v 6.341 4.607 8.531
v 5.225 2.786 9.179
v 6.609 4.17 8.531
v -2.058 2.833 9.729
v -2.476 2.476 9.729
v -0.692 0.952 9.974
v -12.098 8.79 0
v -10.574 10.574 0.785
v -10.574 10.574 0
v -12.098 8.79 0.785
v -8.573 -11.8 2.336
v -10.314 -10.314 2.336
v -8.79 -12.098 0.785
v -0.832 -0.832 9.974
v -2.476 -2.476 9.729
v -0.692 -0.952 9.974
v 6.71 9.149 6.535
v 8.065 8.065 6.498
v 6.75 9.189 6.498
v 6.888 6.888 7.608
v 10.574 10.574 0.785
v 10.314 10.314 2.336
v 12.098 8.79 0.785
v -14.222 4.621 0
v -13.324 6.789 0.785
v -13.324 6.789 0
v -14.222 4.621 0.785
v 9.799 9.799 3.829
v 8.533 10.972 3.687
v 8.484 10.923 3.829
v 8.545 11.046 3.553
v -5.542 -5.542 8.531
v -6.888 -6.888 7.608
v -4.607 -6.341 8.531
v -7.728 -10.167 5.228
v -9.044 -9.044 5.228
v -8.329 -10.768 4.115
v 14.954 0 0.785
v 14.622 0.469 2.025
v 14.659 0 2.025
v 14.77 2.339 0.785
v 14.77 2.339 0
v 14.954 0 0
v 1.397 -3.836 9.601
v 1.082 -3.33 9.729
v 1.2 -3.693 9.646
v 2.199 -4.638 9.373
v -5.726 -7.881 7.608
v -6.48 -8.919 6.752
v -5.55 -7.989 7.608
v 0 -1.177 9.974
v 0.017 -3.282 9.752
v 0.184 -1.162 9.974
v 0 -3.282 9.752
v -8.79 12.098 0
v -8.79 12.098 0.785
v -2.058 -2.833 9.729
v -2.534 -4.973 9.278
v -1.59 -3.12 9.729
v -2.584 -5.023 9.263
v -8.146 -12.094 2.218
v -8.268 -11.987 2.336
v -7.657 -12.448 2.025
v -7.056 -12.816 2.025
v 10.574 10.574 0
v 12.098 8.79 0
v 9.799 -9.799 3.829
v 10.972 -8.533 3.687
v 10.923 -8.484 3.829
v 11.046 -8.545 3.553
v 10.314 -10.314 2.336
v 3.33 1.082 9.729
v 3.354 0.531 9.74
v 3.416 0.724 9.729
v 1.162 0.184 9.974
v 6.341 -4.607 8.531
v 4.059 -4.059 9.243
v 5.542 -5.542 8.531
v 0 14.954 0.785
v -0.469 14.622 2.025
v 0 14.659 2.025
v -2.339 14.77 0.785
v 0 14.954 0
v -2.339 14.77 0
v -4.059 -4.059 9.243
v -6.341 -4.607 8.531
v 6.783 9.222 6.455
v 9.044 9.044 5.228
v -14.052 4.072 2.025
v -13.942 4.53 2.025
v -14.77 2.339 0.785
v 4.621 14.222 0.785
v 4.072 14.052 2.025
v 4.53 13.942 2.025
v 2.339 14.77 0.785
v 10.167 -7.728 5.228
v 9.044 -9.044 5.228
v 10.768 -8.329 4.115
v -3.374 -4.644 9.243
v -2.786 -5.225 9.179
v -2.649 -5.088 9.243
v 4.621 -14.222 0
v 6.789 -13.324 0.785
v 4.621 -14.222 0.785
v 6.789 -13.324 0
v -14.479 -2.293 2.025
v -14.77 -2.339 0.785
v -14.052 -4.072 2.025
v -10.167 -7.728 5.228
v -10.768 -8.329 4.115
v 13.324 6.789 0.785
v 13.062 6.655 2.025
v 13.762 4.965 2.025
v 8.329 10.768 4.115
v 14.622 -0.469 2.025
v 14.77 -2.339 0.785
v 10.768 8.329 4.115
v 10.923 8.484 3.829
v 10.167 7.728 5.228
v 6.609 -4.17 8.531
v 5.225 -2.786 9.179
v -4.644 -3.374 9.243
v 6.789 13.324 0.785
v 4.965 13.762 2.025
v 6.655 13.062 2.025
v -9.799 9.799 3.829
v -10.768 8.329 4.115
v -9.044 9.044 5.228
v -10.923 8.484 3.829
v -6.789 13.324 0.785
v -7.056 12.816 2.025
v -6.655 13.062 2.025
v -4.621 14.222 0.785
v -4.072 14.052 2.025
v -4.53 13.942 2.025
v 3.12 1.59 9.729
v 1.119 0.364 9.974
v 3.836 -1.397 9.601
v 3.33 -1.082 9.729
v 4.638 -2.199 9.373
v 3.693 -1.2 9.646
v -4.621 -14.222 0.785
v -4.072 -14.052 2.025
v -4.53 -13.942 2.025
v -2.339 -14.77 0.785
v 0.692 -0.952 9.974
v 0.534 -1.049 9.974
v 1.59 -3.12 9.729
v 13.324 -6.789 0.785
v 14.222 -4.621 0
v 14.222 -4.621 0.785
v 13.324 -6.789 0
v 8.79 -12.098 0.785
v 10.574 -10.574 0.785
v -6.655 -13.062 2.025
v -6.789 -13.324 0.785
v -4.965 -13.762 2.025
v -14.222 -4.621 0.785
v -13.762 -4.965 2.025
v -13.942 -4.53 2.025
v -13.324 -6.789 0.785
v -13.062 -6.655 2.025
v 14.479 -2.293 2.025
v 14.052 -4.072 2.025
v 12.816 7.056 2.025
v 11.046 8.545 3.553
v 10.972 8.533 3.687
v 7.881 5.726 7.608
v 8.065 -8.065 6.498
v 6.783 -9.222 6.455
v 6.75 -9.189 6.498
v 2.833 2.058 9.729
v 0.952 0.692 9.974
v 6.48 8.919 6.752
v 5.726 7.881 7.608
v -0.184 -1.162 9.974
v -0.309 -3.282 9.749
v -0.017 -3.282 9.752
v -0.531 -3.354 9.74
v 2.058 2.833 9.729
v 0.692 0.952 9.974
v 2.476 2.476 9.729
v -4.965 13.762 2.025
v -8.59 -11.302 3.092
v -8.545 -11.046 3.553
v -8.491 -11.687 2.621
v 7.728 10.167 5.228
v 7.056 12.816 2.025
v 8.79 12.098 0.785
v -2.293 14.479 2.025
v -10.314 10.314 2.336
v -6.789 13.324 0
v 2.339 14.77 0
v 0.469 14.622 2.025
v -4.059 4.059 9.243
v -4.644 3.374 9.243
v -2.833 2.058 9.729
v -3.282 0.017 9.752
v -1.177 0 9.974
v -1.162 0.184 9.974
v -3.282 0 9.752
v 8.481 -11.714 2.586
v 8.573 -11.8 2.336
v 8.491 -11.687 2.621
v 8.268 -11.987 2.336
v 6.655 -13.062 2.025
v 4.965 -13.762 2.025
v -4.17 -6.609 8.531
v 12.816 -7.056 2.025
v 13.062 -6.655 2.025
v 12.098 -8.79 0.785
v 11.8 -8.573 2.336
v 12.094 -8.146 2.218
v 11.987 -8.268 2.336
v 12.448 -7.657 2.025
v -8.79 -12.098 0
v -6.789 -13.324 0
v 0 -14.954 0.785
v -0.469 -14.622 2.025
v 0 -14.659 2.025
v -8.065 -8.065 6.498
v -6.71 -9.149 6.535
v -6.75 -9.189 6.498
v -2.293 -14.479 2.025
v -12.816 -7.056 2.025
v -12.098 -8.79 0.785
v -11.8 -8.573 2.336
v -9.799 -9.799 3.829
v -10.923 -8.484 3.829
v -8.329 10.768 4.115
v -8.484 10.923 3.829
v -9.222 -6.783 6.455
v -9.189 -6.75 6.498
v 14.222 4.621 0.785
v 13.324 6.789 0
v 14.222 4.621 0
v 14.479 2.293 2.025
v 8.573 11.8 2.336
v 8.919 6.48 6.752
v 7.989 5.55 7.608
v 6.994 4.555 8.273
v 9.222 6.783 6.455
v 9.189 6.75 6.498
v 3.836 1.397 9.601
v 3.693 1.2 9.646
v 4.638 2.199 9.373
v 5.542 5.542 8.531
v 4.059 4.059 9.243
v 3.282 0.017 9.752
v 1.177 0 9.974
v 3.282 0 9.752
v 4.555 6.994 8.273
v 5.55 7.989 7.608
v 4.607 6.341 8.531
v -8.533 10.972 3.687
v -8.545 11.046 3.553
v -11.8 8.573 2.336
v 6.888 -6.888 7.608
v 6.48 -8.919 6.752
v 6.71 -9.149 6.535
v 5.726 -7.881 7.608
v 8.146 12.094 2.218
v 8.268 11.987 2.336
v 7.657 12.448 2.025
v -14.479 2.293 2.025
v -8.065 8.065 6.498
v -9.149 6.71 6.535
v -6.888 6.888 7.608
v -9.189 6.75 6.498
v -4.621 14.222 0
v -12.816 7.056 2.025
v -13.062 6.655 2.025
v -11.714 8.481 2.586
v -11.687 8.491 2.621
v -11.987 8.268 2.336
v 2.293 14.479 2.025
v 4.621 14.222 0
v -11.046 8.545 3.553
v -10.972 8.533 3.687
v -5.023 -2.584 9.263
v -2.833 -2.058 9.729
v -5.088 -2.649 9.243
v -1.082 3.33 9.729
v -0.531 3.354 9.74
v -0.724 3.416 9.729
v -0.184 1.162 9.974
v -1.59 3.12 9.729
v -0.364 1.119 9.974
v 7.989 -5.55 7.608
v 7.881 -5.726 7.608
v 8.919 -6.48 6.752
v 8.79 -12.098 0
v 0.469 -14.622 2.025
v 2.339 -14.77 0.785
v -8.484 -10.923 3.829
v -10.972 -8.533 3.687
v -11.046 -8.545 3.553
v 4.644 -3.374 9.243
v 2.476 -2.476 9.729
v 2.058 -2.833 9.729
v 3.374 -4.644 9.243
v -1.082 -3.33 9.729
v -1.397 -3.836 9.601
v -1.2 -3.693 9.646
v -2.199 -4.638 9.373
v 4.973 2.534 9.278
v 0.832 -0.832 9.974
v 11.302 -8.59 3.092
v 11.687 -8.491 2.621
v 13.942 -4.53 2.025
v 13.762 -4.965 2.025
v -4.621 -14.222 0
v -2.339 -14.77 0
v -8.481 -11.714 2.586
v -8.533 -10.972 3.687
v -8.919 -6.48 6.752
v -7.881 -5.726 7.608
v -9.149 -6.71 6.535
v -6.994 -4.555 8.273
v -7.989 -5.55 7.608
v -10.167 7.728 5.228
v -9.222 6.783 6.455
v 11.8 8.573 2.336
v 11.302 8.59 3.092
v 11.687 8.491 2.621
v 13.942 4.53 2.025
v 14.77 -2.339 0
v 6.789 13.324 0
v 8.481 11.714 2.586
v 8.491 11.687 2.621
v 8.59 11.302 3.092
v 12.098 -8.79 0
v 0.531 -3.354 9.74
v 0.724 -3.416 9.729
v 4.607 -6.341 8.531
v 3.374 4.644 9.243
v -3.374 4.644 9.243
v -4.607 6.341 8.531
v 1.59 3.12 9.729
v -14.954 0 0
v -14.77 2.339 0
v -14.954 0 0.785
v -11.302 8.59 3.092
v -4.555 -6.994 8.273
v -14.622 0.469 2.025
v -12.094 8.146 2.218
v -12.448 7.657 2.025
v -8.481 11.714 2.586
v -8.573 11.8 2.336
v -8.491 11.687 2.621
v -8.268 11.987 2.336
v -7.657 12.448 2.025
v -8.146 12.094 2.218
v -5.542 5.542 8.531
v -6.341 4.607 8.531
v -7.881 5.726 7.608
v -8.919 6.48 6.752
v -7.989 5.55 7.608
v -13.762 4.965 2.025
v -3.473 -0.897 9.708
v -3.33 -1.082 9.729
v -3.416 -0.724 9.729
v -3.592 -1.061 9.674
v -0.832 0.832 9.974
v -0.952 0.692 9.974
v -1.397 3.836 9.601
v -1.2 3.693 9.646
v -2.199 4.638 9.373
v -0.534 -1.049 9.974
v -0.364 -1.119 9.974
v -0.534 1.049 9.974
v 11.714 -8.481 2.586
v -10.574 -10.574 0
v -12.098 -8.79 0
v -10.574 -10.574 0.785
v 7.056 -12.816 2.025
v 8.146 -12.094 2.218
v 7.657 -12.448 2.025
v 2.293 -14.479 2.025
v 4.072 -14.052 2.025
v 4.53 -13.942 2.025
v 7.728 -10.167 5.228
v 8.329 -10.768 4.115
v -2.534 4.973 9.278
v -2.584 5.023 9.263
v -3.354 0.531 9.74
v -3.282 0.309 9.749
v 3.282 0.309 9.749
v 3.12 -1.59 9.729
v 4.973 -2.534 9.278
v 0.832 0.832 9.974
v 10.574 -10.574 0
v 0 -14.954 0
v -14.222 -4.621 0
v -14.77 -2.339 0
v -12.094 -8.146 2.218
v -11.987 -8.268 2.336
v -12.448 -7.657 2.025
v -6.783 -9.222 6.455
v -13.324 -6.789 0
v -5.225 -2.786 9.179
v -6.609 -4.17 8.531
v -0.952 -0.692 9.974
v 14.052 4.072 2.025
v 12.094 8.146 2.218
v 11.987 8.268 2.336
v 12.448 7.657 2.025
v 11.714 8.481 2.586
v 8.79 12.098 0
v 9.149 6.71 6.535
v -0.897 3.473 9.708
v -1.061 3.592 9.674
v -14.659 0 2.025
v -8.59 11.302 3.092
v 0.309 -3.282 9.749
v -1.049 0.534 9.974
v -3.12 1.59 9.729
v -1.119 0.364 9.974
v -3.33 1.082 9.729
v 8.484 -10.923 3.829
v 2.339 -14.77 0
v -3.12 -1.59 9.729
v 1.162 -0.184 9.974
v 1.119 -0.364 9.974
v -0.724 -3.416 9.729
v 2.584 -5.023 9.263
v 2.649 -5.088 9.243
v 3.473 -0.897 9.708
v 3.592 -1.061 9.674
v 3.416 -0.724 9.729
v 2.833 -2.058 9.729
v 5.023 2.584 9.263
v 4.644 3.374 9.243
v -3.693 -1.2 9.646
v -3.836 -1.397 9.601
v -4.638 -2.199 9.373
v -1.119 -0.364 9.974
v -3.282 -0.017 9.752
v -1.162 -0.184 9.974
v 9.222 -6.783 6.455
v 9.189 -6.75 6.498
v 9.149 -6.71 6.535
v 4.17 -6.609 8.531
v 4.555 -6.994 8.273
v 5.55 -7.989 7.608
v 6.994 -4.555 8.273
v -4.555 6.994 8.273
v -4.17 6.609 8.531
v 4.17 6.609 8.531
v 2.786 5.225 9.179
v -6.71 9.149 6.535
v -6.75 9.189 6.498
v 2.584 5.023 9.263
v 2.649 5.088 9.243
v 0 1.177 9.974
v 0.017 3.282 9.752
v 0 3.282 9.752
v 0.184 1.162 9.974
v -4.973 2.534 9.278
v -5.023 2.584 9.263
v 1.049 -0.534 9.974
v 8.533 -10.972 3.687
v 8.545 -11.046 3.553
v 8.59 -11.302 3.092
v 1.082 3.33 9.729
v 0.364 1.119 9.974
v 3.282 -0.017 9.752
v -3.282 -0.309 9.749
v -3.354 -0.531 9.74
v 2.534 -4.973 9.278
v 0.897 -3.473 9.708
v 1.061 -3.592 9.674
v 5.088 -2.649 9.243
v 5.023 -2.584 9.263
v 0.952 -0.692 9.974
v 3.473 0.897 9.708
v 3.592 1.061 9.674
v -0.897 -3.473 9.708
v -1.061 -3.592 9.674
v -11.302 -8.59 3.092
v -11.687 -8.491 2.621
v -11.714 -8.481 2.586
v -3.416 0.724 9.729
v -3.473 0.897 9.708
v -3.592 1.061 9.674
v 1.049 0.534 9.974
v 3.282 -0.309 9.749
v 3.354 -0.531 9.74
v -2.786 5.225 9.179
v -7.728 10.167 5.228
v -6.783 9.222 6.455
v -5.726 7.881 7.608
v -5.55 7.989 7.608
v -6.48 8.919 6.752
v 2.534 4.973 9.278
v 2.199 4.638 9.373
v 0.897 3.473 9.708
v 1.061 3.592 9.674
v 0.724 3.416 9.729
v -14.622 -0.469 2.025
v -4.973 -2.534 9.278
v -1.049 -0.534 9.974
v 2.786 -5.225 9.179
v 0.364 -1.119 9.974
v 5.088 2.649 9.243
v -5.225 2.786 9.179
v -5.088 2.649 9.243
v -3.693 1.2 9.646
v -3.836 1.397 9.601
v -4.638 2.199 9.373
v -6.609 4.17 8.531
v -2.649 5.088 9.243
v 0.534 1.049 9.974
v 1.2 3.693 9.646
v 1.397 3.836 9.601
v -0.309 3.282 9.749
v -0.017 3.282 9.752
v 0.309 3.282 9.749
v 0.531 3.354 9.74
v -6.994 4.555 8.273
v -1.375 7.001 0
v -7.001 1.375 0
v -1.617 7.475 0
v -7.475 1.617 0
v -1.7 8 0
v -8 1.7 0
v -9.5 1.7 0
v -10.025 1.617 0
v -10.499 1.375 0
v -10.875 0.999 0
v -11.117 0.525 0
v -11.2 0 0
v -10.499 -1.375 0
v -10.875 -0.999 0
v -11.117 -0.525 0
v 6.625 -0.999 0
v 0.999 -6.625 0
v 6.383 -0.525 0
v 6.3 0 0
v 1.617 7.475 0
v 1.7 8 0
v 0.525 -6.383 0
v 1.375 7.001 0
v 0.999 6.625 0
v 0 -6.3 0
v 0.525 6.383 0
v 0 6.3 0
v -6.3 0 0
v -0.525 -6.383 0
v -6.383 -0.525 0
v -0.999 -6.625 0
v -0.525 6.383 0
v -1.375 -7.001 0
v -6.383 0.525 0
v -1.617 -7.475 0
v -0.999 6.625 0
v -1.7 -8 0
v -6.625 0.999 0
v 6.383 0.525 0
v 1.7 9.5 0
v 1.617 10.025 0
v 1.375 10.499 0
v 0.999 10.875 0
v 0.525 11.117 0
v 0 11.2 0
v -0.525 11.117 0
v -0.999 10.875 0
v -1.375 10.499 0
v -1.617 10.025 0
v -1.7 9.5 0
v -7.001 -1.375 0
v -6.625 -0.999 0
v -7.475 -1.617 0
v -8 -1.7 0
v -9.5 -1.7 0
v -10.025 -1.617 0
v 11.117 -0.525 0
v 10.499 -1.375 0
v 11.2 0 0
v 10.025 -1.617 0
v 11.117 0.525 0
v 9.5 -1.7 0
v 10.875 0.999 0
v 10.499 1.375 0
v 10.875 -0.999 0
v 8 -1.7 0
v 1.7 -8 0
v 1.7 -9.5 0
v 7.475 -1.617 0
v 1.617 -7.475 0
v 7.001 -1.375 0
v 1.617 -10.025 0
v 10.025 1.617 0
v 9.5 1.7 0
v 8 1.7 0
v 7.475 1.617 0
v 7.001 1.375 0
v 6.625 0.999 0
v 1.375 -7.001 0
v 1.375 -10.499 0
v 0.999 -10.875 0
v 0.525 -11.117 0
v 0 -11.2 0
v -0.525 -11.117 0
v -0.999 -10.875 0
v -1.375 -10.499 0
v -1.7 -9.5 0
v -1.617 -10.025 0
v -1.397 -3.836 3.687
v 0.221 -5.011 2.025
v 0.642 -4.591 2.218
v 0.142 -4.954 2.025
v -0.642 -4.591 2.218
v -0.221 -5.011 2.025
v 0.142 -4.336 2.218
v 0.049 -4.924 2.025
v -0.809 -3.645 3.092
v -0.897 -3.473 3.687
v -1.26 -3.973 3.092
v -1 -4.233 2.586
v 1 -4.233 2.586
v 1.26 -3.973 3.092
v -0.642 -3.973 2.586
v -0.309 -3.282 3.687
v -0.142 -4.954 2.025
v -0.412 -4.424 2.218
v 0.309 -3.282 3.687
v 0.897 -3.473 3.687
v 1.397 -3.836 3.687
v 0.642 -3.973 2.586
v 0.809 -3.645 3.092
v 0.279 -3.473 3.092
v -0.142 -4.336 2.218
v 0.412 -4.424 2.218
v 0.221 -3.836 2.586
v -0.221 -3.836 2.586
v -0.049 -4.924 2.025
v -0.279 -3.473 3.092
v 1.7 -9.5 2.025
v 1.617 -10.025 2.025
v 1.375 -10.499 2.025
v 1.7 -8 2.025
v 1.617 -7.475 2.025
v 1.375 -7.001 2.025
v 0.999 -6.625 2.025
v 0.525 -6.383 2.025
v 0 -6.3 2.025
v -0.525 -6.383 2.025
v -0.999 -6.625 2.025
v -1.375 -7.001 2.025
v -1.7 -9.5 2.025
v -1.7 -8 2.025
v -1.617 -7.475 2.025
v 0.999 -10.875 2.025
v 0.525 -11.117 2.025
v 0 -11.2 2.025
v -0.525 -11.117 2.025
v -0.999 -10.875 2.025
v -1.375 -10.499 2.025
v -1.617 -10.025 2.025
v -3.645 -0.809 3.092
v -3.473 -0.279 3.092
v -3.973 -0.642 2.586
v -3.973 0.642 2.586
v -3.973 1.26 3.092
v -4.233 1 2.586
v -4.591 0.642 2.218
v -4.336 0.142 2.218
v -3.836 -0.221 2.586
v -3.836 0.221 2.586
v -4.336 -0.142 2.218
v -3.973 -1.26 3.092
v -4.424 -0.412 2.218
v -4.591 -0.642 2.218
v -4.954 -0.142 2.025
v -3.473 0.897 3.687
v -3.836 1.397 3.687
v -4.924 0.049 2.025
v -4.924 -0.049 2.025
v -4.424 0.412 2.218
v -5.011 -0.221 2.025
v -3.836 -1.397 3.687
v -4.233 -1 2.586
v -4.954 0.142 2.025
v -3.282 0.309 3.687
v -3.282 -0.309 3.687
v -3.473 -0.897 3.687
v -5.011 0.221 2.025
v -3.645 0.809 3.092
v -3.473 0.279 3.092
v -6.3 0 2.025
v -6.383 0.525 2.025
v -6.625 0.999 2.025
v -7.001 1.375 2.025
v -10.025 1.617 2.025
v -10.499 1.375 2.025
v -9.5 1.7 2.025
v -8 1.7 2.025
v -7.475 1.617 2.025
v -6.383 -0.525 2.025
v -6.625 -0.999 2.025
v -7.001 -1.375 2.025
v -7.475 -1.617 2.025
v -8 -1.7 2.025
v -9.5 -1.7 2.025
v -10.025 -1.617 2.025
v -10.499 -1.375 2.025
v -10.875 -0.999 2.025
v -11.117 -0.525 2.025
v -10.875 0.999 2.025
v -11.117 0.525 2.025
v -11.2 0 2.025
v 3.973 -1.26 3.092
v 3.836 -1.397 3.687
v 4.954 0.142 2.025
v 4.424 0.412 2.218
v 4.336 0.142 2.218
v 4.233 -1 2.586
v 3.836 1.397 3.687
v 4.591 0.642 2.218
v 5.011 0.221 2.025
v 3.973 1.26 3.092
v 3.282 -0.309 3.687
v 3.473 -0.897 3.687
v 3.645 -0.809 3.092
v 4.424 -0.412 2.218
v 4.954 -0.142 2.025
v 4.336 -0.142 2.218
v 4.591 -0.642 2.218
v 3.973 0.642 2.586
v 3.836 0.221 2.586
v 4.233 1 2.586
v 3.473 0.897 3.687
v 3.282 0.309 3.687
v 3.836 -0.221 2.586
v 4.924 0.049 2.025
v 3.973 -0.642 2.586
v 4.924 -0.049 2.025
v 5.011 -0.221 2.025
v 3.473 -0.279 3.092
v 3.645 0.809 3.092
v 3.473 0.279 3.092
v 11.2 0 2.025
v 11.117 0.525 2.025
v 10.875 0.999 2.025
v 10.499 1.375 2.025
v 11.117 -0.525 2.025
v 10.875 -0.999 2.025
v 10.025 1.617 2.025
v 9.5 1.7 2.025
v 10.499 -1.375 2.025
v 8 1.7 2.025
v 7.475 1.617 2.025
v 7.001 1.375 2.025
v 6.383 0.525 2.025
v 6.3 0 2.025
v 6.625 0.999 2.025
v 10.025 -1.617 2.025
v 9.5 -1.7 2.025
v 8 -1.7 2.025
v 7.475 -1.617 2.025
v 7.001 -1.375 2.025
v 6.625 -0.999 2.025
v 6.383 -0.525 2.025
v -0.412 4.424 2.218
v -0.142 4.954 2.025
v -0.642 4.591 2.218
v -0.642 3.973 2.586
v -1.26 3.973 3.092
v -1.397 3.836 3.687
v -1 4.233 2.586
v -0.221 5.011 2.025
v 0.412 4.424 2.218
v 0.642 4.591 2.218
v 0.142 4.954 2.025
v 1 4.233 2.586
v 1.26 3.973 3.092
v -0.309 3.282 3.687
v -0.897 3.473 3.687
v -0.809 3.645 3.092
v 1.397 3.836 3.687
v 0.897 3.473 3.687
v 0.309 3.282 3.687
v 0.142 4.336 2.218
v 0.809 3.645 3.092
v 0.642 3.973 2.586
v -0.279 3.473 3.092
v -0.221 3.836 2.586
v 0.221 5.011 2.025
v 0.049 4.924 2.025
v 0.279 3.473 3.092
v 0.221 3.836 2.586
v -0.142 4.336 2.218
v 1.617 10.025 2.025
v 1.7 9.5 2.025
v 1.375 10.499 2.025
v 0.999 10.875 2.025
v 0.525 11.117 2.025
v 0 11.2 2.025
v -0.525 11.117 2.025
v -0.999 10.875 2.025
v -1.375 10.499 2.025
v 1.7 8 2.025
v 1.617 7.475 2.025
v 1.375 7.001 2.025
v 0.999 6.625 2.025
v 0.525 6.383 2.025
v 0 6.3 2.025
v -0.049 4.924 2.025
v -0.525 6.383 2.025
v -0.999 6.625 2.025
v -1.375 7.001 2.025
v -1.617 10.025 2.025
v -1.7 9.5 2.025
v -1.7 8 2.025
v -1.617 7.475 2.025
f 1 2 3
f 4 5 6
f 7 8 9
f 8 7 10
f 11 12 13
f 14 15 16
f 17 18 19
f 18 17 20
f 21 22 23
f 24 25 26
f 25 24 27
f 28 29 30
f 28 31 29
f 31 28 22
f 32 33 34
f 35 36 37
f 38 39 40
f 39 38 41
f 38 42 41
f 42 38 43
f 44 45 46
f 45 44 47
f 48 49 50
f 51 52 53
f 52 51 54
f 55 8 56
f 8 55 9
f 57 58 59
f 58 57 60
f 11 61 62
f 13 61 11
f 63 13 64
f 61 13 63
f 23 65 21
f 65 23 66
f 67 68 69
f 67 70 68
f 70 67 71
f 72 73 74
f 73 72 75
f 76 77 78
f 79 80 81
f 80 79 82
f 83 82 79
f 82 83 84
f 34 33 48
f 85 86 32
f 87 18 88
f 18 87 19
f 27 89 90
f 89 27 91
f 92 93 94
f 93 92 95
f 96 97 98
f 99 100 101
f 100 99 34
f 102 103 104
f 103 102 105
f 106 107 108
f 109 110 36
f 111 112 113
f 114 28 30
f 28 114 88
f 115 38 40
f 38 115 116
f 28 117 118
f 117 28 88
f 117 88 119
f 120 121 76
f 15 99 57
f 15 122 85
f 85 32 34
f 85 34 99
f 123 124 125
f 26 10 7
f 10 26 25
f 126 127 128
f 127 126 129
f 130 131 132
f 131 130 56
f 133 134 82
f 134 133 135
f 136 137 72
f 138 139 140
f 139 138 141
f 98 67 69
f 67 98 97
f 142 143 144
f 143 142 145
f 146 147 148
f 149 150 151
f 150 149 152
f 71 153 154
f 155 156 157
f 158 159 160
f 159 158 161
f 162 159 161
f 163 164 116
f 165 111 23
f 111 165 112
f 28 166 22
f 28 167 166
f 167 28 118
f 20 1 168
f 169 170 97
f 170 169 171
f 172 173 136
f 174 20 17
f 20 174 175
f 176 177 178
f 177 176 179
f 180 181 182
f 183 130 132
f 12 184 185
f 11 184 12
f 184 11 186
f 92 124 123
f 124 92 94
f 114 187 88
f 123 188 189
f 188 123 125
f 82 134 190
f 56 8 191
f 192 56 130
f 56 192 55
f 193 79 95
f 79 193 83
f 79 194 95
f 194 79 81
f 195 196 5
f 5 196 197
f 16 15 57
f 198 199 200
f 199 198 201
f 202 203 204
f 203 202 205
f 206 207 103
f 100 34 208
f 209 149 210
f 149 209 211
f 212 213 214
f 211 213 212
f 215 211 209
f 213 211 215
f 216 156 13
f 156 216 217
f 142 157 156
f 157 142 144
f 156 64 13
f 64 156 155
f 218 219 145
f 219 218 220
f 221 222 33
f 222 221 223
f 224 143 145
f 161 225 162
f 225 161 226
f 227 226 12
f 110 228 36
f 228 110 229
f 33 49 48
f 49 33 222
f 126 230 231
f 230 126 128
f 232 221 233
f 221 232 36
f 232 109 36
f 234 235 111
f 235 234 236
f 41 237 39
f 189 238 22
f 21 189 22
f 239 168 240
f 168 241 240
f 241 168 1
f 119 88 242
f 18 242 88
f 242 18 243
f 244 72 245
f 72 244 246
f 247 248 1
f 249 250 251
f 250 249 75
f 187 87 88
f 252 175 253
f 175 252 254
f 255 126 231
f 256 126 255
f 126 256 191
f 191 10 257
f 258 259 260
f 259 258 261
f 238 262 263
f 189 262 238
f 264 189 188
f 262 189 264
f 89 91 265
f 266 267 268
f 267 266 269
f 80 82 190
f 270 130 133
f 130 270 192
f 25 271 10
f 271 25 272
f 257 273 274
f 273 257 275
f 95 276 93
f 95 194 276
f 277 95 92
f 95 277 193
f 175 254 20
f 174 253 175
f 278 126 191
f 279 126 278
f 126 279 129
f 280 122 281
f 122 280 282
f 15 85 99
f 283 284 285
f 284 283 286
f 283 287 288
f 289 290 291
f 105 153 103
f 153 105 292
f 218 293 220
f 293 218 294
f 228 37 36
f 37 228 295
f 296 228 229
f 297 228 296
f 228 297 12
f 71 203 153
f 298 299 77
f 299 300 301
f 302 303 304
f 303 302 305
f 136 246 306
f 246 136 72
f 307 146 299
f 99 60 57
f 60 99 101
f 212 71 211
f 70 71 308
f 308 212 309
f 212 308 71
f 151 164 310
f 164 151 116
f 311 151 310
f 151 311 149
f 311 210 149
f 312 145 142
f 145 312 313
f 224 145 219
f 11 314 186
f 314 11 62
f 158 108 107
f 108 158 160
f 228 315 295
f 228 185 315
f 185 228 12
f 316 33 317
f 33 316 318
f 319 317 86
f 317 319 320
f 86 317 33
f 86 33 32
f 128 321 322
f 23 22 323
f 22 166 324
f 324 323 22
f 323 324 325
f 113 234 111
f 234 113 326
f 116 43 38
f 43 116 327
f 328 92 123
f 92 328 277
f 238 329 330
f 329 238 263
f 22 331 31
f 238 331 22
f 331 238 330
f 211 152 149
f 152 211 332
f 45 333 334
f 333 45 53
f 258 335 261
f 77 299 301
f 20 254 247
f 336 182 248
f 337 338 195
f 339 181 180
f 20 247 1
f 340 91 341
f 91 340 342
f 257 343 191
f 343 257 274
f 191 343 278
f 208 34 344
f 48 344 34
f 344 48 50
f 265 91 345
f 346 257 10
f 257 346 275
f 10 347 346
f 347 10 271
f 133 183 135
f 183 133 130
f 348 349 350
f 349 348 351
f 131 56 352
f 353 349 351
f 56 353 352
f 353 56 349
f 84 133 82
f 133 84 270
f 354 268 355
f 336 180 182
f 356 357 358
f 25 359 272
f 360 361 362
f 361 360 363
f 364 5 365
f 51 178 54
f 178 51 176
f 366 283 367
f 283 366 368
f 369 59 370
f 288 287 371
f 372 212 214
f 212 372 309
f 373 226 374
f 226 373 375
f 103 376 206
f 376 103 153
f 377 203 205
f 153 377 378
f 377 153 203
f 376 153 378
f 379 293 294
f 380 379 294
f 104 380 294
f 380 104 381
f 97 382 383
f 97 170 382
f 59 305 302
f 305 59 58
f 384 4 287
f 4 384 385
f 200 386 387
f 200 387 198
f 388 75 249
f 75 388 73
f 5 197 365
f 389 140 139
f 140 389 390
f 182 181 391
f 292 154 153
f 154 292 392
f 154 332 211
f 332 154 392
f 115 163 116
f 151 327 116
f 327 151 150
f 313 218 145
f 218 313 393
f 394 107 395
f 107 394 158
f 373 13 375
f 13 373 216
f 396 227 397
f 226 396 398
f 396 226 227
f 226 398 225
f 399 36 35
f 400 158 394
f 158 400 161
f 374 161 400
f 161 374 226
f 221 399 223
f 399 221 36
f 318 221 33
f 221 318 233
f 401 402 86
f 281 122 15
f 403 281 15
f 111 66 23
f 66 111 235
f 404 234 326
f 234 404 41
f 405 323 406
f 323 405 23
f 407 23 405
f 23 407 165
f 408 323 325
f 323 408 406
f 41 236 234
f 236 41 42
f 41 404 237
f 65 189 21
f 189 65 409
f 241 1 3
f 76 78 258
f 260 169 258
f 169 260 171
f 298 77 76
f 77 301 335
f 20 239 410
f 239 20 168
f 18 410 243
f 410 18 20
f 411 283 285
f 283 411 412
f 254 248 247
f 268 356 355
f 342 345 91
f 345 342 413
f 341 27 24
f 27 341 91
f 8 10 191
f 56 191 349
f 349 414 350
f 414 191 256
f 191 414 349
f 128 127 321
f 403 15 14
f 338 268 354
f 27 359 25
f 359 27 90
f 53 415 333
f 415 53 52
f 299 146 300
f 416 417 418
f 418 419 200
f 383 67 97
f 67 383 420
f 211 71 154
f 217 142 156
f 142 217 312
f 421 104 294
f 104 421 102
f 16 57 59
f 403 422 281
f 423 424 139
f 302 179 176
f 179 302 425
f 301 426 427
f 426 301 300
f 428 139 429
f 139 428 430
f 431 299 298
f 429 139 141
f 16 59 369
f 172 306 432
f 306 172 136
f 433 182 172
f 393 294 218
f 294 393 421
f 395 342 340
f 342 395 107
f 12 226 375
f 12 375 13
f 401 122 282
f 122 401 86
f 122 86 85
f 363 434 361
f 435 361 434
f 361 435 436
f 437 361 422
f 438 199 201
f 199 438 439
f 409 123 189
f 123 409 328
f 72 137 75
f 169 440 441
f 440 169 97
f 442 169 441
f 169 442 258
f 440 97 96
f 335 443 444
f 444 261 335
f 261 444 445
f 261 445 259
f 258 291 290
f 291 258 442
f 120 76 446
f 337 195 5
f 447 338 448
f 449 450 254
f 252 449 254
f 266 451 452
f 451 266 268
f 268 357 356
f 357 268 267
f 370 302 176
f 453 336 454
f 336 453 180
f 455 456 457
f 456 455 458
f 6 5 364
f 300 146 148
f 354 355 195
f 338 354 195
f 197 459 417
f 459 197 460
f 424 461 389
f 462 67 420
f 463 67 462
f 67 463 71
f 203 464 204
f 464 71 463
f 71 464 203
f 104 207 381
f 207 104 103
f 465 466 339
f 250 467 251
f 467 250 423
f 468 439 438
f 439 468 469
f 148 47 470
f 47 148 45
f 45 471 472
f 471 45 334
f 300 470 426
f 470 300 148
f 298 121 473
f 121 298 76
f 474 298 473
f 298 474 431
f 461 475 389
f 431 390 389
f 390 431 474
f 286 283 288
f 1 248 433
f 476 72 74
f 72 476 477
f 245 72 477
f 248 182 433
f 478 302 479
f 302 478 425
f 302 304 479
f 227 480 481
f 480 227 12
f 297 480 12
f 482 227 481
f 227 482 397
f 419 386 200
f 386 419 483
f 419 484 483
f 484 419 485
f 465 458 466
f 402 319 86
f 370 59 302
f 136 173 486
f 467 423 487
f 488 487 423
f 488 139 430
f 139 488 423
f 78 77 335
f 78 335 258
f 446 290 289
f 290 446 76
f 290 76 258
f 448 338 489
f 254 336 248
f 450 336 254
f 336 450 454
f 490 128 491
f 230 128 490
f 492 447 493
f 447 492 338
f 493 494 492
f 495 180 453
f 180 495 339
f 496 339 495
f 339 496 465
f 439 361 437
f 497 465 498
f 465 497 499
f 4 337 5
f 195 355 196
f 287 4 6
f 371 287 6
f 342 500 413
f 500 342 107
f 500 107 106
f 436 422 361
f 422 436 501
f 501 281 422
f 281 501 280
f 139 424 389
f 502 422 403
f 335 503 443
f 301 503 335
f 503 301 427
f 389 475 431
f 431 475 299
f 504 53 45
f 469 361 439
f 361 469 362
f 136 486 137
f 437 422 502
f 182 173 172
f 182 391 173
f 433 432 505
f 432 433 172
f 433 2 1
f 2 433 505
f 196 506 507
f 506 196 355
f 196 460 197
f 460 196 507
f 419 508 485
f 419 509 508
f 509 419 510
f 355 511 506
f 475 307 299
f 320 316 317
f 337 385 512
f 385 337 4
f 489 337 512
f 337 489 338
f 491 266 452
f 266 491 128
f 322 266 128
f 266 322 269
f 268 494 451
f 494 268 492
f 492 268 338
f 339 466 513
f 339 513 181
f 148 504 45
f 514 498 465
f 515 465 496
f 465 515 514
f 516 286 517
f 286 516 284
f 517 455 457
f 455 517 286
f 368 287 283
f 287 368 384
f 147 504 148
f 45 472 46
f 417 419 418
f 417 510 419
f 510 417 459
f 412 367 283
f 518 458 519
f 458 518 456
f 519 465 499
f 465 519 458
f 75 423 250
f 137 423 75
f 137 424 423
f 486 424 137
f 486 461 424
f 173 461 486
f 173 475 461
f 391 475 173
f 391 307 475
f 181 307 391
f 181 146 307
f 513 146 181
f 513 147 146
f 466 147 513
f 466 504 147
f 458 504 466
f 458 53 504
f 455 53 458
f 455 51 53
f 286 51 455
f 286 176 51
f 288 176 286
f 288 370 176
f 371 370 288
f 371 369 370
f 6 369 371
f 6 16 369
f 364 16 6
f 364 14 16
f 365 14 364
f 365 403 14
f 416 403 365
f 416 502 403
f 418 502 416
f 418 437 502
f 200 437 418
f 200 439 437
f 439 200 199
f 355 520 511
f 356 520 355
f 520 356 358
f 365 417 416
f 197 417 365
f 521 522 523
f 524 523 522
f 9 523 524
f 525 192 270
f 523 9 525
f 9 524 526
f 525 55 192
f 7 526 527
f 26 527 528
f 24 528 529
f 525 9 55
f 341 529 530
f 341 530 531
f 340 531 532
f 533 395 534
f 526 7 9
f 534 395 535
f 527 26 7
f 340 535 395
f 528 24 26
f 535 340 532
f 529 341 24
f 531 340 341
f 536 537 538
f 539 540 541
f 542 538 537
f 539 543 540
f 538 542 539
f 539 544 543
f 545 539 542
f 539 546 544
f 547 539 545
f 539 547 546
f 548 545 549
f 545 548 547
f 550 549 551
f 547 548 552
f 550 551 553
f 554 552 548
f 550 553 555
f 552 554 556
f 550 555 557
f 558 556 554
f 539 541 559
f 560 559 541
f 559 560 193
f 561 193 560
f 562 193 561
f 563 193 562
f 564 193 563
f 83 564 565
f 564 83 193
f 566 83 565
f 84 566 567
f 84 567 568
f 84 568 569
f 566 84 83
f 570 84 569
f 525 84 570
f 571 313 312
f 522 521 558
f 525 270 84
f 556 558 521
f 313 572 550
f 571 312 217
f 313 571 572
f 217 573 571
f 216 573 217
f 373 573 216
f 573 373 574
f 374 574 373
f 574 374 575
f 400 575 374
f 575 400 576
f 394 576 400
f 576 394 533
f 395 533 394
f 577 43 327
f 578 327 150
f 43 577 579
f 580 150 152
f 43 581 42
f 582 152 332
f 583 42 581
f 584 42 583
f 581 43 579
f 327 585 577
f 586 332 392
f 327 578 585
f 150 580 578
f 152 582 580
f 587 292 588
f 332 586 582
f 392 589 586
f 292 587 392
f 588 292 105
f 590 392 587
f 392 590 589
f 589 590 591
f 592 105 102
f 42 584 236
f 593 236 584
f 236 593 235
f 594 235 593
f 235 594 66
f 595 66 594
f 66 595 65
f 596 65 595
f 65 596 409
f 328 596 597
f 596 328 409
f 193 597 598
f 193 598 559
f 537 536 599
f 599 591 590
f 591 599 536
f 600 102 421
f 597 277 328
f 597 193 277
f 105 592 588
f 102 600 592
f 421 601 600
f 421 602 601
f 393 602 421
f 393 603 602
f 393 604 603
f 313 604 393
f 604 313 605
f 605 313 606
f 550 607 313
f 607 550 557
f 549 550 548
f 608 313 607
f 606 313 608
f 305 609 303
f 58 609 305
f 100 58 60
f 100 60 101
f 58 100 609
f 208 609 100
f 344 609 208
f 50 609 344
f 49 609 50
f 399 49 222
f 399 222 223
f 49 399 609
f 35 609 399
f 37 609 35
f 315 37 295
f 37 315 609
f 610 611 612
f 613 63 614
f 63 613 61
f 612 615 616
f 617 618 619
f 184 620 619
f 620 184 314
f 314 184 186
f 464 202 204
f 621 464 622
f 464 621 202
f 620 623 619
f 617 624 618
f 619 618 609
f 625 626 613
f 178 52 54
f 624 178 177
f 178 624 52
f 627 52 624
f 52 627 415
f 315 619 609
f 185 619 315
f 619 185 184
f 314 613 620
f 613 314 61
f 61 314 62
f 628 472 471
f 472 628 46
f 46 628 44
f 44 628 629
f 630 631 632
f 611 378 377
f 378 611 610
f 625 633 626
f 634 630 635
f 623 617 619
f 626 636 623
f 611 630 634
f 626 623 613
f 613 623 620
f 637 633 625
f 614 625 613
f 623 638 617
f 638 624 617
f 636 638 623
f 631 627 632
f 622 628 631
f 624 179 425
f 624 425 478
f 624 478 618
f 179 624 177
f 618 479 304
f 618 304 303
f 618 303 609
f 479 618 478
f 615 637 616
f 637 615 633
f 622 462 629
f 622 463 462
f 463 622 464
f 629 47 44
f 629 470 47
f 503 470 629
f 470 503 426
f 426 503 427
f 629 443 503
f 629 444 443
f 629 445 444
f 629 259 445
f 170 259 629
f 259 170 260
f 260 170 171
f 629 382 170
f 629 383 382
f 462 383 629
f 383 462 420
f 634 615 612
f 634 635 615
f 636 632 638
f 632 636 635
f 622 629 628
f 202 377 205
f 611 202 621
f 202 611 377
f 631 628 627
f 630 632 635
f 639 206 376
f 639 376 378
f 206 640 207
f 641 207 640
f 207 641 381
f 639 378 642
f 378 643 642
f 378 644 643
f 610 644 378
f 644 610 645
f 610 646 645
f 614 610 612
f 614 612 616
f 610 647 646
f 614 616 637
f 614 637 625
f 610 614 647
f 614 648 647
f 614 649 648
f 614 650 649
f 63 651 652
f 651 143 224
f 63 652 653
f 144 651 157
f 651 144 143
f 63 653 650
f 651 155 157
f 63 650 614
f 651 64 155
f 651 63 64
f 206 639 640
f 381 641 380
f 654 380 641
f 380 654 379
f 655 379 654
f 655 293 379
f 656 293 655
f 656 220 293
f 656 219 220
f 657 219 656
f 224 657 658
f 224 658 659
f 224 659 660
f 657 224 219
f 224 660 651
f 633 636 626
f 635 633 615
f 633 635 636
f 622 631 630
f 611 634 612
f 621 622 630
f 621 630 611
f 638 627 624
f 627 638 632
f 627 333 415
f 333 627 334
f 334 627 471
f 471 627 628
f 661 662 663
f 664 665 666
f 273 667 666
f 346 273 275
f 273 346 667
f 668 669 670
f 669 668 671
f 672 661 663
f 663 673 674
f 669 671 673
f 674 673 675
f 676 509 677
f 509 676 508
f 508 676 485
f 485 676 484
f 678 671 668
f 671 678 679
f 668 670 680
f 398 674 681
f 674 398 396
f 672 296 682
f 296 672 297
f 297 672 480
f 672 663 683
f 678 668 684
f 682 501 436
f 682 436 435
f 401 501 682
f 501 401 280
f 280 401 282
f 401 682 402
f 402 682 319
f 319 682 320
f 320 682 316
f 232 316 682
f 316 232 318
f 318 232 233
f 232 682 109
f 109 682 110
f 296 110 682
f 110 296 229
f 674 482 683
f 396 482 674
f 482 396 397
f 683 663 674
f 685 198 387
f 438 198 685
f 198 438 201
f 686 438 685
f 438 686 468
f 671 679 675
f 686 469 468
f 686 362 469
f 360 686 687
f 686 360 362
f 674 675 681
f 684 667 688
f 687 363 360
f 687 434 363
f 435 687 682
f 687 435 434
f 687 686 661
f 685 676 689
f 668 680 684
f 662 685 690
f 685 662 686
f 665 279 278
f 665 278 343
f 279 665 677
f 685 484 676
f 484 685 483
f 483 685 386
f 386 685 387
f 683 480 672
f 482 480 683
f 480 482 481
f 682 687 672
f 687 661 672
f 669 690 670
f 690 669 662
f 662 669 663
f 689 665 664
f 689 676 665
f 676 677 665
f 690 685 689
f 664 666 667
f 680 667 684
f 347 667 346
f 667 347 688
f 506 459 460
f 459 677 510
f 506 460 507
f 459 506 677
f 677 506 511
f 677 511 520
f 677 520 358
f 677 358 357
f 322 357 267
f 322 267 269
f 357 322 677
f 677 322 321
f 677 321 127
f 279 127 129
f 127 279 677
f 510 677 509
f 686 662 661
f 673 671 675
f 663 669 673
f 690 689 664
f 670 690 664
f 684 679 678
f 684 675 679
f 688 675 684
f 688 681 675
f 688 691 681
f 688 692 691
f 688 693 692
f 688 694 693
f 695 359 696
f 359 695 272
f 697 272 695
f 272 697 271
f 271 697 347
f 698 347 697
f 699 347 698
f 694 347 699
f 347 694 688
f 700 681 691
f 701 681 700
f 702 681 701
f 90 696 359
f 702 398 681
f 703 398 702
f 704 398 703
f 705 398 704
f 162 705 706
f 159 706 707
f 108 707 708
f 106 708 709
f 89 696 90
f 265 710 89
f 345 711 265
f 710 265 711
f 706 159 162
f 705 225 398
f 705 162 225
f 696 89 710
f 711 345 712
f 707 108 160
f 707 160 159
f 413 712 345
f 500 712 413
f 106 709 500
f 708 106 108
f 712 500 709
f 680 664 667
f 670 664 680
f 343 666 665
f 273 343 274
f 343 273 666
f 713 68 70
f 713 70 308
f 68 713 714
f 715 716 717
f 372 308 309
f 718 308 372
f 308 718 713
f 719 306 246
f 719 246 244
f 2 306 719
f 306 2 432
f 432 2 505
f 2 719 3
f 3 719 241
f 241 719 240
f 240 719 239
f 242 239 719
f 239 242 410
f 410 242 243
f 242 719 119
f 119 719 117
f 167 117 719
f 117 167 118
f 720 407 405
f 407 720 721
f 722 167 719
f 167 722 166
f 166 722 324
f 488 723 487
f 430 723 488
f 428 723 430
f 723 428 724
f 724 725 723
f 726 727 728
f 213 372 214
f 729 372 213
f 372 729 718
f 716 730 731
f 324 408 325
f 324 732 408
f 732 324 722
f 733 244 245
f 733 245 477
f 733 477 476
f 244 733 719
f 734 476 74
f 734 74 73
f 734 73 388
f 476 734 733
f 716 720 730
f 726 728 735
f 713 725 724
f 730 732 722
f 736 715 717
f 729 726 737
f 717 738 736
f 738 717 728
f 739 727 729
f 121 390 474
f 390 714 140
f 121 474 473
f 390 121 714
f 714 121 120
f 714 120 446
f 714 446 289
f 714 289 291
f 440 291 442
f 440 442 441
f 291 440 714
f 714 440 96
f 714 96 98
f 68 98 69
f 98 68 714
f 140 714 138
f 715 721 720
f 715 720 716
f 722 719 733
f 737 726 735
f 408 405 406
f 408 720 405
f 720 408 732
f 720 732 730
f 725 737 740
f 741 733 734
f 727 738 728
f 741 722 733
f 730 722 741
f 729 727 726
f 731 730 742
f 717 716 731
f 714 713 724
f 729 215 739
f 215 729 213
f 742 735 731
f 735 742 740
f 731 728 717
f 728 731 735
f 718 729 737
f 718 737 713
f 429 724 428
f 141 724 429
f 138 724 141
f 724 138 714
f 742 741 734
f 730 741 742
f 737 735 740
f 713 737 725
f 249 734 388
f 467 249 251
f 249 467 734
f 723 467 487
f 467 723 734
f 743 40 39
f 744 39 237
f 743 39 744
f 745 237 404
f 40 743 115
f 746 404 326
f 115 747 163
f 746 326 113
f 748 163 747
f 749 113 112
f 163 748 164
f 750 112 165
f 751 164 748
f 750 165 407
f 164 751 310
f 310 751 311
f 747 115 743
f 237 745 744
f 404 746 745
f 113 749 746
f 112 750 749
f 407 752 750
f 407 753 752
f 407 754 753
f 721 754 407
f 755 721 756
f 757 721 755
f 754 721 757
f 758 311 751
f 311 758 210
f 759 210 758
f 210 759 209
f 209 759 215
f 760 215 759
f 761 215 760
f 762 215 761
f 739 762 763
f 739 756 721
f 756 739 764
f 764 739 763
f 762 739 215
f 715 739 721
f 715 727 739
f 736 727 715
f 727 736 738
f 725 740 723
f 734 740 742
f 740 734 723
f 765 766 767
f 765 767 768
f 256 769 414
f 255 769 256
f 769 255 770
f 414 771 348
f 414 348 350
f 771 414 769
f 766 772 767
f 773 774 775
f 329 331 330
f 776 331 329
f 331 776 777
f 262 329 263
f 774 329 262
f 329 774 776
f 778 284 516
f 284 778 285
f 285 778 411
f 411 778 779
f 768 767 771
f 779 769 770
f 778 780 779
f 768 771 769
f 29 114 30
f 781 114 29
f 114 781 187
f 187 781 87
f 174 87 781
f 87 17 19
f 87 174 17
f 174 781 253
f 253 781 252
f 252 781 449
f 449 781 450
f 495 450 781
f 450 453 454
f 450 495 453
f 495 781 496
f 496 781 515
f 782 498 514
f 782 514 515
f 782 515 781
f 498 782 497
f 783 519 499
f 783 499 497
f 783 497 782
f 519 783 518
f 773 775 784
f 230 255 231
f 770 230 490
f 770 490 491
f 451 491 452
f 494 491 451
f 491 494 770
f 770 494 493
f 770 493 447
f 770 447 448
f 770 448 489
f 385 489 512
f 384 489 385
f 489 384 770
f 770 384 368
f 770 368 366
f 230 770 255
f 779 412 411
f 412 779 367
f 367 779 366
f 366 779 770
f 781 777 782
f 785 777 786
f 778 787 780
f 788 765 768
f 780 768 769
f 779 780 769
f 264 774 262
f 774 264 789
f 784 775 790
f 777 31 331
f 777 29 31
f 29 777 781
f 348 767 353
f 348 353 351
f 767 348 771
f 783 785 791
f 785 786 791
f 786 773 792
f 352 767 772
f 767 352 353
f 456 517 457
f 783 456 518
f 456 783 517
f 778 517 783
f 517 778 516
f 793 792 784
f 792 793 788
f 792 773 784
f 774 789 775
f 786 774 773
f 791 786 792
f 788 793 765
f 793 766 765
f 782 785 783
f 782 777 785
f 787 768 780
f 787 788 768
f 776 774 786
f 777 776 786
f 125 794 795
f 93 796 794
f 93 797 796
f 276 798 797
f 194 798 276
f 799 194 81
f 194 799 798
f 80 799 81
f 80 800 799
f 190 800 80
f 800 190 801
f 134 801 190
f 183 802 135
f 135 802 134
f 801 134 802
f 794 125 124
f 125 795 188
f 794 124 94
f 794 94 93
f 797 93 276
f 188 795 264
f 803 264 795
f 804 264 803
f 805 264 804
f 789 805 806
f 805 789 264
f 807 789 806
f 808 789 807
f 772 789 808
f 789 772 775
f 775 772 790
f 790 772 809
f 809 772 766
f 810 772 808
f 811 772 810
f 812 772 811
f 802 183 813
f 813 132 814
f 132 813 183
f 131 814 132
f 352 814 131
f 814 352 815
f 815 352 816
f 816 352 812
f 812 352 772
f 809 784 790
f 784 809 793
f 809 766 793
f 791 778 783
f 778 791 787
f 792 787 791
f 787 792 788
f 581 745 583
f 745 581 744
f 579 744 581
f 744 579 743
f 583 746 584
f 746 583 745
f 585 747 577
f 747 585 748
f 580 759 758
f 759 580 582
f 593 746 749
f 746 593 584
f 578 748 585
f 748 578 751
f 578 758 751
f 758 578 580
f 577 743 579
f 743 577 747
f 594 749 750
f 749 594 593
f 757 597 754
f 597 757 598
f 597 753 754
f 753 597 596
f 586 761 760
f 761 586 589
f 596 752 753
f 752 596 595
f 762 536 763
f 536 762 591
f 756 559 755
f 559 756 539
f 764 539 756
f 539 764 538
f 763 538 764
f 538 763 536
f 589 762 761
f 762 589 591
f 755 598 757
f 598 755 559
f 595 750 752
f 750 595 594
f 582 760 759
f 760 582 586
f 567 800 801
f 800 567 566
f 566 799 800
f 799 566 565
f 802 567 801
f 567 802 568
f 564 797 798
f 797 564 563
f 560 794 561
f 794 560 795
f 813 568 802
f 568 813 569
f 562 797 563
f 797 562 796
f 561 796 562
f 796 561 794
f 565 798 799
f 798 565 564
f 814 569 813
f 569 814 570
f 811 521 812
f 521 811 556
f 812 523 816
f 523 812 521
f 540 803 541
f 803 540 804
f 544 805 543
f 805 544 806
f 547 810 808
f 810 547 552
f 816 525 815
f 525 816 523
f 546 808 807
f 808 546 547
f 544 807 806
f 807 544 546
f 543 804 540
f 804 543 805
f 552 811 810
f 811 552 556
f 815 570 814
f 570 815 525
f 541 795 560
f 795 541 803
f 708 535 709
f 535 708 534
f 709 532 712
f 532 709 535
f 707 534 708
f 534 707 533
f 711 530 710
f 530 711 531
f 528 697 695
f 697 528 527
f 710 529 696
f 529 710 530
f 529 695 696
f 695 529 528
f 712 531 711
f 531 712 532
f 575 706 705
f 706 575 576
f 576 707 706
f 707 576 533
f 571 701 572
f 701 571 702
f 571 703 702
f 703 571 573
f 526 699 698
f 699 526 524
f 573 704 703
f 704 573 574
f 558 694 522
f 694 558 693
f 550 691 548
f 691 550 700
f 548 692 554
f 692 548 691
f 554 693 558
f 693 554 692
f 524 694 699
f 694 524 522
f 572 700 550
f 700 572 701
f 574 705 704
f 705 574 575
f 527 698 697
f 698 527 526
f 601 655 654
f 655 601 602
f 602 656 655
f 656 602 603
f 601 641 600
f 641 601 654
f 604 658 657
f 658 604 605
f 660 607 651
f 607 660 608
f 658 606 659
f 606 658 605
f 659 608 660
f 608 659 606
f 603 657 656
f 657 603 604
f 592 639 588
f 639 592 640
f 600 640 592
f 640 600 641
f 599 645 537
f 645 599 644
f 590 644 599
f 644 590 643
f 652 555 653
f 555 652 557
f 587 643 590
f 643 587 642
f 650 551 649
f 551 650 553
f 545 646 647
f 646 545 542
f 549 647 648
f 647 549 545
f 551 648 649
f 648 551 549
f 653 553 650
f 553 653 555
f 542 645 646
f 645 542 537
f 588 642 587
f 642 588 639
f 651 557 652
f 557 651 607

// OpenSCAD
// file: dronePlates.scad
/**
 * dronePlates.scad
 * Plate library
 *
 * GNU GPL V3
 * @author: Victor Potenciano
 */

m3Rad = 3.4/2;
cornerR = 4;

/**
 *
 */
module helperDisk(diameter) {
	cylinder(r = diameter/2, h = 0.6, $fn=20);
}

/**
 *
 */
module roundedRect(size, radius) {
	x = size[0];
	y = size[1];
	z = size[2];

	linear_extrude(height=z)
	hull() {
	// place 4 circles in the corners, with the given radius
	translate([(-x/2)+(radius/2), (-y/2)+(radius/2), 0]){ circle(r=radius); }
	translate([(x/2)-(radius/2), (-y/2)+(radius/2), 0]){ circle(r=radius); }
	translate([(-x/2)+(radius/2), (y/2)-(radius/2), 0]){ circle(r=radius); }
	translate([(x/2)-(radius/2), (y/2)-(radius/2), 0]){ circle(r=radius); }
	}
}

/**
 * rounded rectangle triangle with corner at origin
 */
module roundedTriangle(size, radius) {
	x = size[0];
	y = size[1];
	z = size[2];

	linear_extrude(height=z)
	hull() {
	translate([radius, radius, 0]){ circle(r=radius); }
	translate([x-radius, radius, 0]){ circle(r=radius); }
	translate([radius, y-radius, 0]){ circle(r=radius); }
	}
}

/**
 *
 */
module roundRectPlate(w, l, plateThick=3) {
	difference(){
		roundedRect([l+m3Rad*1.75,w+m3Rad*1.75,plateThick], cornerR);
		translate([l/2, w/2, -0.5]) { cylinder(h = plateThick+1, r = m3Rad, $fn=30); }
		translate([-l/2, w/2, -0.5]) { cylinder(h = plateThick+1, r = m3Rad, $fn=30); }
		translate([l/2, -w/2, -0.5]) { cylinder(h = plateThick+1, r = m3Rad, $fn=30); }
		translate([-l/2, -w/2, -0.5]) { cylinder(h = plateThick+1, r = m3Rad, $fn=30); }
	}
}

/**
 *
 */
module crossSquarePlate(l, thick=3) {
	inDist = cornerR*2+4;
	trianL = sqrt((l*l)/2)-inDist;
	centerR = 4;

	difference(){
		roundRectPlate(l, l, thick);
		translate([0, centerR, -0.5]) { 
			rotate([0,0,45]){ roundedTriangle([trianL,trianL,thick+1], cornerR-2); }
		}
		translate([0, -centerR, -0.5]) { 
			rotate([0,0,225]){ roundedTriangle([trianL,trianL,thick+1], cornerR-2); }
		}
		translate([-centerR, 0, -0.5]) { 
			rotate([0,0,135]){ roundedTriangle([trianL,trianL,thick+1], cornerR-2); }
		}
		translate([centerR, 0, -0.5]) { 
			rotate([0,0,-45]){ roundedTriangle([trianL,trianL,thick+1], cornerR-2); }
		}
	}
}

/**
 *
 */
module hShapePlate(w, l, thick=4) {
	inDist = cornerR*2+1;

	difference(){
		roundRectPlate(w, l, thick);
		translate([0, w/4, -0.5]) { roundedRect([l-inDist,w/2-inDist,thick+1], cornerR-2); }
		translate([0, -w/4, -0.5]) { roundedRect([l-inDist,w/2-inDist,thick+1], cornerR-2); }
	}
}

/**
 *
 */
module motorCircleMount(inDia, outDia, thick=3, extraH=false, d1=19, d2=16, holeR=m3Rad ) {
	difference(){
		cylinder(h = thick, r = outDia/2, $fn=30);
		motorCircleMountHoles(inDia, outDia, thick, extraH, d1=d1, d2=d2, holeR=holeR);
	}
}

/**
 *
 */
module motorCircleMountHoles(inDia, outDia, thick=3, extraH=false, d1=19, d2=16, d3=25, holeR=m3Rad) {
	translate([0, 0, -0.5]) { cylinder(h = thick+1, r = inDia/2, $fn=30); }

	for(i=[0:3]) {
		rotate([0,0,90*i]){
		translate([d1/2, 0, -0.5]) cylinder(h = thick+1, r = holeR, $fn=20);
		translate([d2/2, 0, -0.5]) cylinder(h = thick+1, r = holeR, $fn=20);
		translate([d2/2, -holeR, -0.5]) cube(size = [(d1-d2)/2,holeR*2,thick+1]);
		}
	}
	
	if(extraH==true){	
		for(i=[-1,1]) translate([i*d3/2, 0, -0.5]) { cylinder(h = thick+1, r = holeR, $fn=30); }
	}
}

/**
 *
 */
module motorRectMount(w, l, inDia, thick=3) {
	d1=19;
	d2=16;

	difference(){
		roundRectPlate(w, l, thick);
		translate([0, 0, -0.5]) { cylinder(h = thick+1, r = inDia/2, $fn=30); }
		translate([0, d1/2, -0.5]) { cylinder(h = thick+1, r = m3Rad, $fn=30); }
		translate([0, -d1/2, -0.5]) { cylinder(h = thick+1, r = m3Rad, $fn=30); }
		translate([d2/2, 0, -0.5]) { cylinder(h = thick+1, r = m3Rad, $fn=30); }
		translate([-d2/2, 0, -0.5]) { cylinder(h = thick+1, r = m3Rad, $fn=30); }
	}
}

/**
 *
 */
module tube(inDia, outDia, height) {
	difference(){
		cylinder(h = height, r = outDia/2, $fn=50);
		translate([0, 0, -0.5]) { cylinder(h = height+1, r = inDia/2, $fn=30); }
	}
}

/**
 *
 */
module squareTube(inDia, outDia, height) {
	translate([0,0,height/2]){
	difference(){
		cube(size = [outDia,outDia,height], center = true);
		cube(size = [inDia,inDia,height+1], center = true);
	}
	}
}

/**
 *
 */
module djiFlamewheelHoles(height) {
	a = 23;
	b = 16;
	c = 19.5;
	
	translate([a/2, c/2, 0]) { cylinder(h = height, r = m3Rad, $fn=30); }
	translate([-a/2, c/2, 0]) { cylinder(h = height, r = m3Rad, $fn=30); }
	translate([b/2, -c/2, 0]) { cylinder(h = height, r = m3Rad, $fn=30); }
	translate([-b/2, -c/2, 0]) { cylinder(h = height, r = m3Rad, $fn=30); }
}

/**
 *
 */
module djiFlamewheelHolesBotton(height) {
	a1 = 21;
	c = 19.5;
	
	translate([a1/2, c/2, 0]) { cylinder(h = height, r = m3Rad, $fn=30); }
	translate([-a1/2, c/2, 0]) { cylinder(h = height, r = m3Rad, $fn=30); }
}

/**
 *
 */
module propeller(size){
union(){
difference(){
	cylinder(h = 3, r = size/2, center=true, $fn=30);
	cylinder(h = 3.1, r = size/2-2, center=true, $fn=30); 
}
for( i = [-1,1] ){
rotate([0,0,45*i]){ cube(size = [size,4,1], center = true); }
}
}
}

/**
 *
 */
module slot(length, height, rad){
for(i=[-1,1]) translate([i*length/2,0,0]) cylinder(h = height, r = rad, $fn=30);
translate([0,0,height/2]) cube(size = [length,rad*2,height], center = true);
}

 

////////////////////////
// Examples:
////////////////////////

motorCircleMount(8, 25, 3.5);

//roundedRect([50,50,3], 4);

//hShapePlate(79, 25);

//rotate([0,0,45]){roundedTriangle([40,40,3], 4);}

//crossSquarePlate(45, 4);

/*
union(){
motorRectMount(21, 18, 8, 4);
translate([9, 10.5, 0]) {tube(m3Rad*2, 6.5, 6);}
}
*/

/*
difference(){
union(){
hShapePlate(50, 30, 3.5);
translate([-4,-25,0]){cube(size = [8,50,3.5]);}
rotate([0, 0, 45]) {motorCircleMount(8, 35, 3.5);}
}
cylinder(h = 10, r = 4, $fn=100, center=true);
}
*/

//rotate([90,0,0]){ tube(5,10,20); }
//translate([20,0,0]){ squareTube(5, 10, 20); }
// main file
/**
 * mini quad tall landing skid
 */

use <dronePlates.scad>;

m3Rad = 3.4/2;
height = 10;
diameter = 30;
thick = 2;
nerve = 2.7;
scaleZ = 0.667; //(heigth/(diameter/2))

/**
 *
 */
module ellipsoid(){
scale([1,1,scaleZ])
difference(){
sphere(r = diameter/2, $fn=40);
translate([0,0,-diameter/2]) cube(size=[diameter,diameter,diameter], center=true);

}//diff
}//end module

/**
 *
 */
module roundedCube(size, rad){
minkowski()
{
 cube(size, center=true);
 sphere(r = rad, $fn=20);
}
}//end module


difference(){

rotate([0,0,45]) ellipsoid();

rotate([0,0,45]) for(i=[-1,1]) for(j=[-1,1]){
translate([i*(20/2+nerve+1),j*(20/2+nerve+1),height/2+2+thick]) roundedCube([20,20,height],rad=2);
}

motorCircleMountHoles(0, diameter, thick=thick, d1=19, d2=16, holeR=m3Rad);

}//diff
